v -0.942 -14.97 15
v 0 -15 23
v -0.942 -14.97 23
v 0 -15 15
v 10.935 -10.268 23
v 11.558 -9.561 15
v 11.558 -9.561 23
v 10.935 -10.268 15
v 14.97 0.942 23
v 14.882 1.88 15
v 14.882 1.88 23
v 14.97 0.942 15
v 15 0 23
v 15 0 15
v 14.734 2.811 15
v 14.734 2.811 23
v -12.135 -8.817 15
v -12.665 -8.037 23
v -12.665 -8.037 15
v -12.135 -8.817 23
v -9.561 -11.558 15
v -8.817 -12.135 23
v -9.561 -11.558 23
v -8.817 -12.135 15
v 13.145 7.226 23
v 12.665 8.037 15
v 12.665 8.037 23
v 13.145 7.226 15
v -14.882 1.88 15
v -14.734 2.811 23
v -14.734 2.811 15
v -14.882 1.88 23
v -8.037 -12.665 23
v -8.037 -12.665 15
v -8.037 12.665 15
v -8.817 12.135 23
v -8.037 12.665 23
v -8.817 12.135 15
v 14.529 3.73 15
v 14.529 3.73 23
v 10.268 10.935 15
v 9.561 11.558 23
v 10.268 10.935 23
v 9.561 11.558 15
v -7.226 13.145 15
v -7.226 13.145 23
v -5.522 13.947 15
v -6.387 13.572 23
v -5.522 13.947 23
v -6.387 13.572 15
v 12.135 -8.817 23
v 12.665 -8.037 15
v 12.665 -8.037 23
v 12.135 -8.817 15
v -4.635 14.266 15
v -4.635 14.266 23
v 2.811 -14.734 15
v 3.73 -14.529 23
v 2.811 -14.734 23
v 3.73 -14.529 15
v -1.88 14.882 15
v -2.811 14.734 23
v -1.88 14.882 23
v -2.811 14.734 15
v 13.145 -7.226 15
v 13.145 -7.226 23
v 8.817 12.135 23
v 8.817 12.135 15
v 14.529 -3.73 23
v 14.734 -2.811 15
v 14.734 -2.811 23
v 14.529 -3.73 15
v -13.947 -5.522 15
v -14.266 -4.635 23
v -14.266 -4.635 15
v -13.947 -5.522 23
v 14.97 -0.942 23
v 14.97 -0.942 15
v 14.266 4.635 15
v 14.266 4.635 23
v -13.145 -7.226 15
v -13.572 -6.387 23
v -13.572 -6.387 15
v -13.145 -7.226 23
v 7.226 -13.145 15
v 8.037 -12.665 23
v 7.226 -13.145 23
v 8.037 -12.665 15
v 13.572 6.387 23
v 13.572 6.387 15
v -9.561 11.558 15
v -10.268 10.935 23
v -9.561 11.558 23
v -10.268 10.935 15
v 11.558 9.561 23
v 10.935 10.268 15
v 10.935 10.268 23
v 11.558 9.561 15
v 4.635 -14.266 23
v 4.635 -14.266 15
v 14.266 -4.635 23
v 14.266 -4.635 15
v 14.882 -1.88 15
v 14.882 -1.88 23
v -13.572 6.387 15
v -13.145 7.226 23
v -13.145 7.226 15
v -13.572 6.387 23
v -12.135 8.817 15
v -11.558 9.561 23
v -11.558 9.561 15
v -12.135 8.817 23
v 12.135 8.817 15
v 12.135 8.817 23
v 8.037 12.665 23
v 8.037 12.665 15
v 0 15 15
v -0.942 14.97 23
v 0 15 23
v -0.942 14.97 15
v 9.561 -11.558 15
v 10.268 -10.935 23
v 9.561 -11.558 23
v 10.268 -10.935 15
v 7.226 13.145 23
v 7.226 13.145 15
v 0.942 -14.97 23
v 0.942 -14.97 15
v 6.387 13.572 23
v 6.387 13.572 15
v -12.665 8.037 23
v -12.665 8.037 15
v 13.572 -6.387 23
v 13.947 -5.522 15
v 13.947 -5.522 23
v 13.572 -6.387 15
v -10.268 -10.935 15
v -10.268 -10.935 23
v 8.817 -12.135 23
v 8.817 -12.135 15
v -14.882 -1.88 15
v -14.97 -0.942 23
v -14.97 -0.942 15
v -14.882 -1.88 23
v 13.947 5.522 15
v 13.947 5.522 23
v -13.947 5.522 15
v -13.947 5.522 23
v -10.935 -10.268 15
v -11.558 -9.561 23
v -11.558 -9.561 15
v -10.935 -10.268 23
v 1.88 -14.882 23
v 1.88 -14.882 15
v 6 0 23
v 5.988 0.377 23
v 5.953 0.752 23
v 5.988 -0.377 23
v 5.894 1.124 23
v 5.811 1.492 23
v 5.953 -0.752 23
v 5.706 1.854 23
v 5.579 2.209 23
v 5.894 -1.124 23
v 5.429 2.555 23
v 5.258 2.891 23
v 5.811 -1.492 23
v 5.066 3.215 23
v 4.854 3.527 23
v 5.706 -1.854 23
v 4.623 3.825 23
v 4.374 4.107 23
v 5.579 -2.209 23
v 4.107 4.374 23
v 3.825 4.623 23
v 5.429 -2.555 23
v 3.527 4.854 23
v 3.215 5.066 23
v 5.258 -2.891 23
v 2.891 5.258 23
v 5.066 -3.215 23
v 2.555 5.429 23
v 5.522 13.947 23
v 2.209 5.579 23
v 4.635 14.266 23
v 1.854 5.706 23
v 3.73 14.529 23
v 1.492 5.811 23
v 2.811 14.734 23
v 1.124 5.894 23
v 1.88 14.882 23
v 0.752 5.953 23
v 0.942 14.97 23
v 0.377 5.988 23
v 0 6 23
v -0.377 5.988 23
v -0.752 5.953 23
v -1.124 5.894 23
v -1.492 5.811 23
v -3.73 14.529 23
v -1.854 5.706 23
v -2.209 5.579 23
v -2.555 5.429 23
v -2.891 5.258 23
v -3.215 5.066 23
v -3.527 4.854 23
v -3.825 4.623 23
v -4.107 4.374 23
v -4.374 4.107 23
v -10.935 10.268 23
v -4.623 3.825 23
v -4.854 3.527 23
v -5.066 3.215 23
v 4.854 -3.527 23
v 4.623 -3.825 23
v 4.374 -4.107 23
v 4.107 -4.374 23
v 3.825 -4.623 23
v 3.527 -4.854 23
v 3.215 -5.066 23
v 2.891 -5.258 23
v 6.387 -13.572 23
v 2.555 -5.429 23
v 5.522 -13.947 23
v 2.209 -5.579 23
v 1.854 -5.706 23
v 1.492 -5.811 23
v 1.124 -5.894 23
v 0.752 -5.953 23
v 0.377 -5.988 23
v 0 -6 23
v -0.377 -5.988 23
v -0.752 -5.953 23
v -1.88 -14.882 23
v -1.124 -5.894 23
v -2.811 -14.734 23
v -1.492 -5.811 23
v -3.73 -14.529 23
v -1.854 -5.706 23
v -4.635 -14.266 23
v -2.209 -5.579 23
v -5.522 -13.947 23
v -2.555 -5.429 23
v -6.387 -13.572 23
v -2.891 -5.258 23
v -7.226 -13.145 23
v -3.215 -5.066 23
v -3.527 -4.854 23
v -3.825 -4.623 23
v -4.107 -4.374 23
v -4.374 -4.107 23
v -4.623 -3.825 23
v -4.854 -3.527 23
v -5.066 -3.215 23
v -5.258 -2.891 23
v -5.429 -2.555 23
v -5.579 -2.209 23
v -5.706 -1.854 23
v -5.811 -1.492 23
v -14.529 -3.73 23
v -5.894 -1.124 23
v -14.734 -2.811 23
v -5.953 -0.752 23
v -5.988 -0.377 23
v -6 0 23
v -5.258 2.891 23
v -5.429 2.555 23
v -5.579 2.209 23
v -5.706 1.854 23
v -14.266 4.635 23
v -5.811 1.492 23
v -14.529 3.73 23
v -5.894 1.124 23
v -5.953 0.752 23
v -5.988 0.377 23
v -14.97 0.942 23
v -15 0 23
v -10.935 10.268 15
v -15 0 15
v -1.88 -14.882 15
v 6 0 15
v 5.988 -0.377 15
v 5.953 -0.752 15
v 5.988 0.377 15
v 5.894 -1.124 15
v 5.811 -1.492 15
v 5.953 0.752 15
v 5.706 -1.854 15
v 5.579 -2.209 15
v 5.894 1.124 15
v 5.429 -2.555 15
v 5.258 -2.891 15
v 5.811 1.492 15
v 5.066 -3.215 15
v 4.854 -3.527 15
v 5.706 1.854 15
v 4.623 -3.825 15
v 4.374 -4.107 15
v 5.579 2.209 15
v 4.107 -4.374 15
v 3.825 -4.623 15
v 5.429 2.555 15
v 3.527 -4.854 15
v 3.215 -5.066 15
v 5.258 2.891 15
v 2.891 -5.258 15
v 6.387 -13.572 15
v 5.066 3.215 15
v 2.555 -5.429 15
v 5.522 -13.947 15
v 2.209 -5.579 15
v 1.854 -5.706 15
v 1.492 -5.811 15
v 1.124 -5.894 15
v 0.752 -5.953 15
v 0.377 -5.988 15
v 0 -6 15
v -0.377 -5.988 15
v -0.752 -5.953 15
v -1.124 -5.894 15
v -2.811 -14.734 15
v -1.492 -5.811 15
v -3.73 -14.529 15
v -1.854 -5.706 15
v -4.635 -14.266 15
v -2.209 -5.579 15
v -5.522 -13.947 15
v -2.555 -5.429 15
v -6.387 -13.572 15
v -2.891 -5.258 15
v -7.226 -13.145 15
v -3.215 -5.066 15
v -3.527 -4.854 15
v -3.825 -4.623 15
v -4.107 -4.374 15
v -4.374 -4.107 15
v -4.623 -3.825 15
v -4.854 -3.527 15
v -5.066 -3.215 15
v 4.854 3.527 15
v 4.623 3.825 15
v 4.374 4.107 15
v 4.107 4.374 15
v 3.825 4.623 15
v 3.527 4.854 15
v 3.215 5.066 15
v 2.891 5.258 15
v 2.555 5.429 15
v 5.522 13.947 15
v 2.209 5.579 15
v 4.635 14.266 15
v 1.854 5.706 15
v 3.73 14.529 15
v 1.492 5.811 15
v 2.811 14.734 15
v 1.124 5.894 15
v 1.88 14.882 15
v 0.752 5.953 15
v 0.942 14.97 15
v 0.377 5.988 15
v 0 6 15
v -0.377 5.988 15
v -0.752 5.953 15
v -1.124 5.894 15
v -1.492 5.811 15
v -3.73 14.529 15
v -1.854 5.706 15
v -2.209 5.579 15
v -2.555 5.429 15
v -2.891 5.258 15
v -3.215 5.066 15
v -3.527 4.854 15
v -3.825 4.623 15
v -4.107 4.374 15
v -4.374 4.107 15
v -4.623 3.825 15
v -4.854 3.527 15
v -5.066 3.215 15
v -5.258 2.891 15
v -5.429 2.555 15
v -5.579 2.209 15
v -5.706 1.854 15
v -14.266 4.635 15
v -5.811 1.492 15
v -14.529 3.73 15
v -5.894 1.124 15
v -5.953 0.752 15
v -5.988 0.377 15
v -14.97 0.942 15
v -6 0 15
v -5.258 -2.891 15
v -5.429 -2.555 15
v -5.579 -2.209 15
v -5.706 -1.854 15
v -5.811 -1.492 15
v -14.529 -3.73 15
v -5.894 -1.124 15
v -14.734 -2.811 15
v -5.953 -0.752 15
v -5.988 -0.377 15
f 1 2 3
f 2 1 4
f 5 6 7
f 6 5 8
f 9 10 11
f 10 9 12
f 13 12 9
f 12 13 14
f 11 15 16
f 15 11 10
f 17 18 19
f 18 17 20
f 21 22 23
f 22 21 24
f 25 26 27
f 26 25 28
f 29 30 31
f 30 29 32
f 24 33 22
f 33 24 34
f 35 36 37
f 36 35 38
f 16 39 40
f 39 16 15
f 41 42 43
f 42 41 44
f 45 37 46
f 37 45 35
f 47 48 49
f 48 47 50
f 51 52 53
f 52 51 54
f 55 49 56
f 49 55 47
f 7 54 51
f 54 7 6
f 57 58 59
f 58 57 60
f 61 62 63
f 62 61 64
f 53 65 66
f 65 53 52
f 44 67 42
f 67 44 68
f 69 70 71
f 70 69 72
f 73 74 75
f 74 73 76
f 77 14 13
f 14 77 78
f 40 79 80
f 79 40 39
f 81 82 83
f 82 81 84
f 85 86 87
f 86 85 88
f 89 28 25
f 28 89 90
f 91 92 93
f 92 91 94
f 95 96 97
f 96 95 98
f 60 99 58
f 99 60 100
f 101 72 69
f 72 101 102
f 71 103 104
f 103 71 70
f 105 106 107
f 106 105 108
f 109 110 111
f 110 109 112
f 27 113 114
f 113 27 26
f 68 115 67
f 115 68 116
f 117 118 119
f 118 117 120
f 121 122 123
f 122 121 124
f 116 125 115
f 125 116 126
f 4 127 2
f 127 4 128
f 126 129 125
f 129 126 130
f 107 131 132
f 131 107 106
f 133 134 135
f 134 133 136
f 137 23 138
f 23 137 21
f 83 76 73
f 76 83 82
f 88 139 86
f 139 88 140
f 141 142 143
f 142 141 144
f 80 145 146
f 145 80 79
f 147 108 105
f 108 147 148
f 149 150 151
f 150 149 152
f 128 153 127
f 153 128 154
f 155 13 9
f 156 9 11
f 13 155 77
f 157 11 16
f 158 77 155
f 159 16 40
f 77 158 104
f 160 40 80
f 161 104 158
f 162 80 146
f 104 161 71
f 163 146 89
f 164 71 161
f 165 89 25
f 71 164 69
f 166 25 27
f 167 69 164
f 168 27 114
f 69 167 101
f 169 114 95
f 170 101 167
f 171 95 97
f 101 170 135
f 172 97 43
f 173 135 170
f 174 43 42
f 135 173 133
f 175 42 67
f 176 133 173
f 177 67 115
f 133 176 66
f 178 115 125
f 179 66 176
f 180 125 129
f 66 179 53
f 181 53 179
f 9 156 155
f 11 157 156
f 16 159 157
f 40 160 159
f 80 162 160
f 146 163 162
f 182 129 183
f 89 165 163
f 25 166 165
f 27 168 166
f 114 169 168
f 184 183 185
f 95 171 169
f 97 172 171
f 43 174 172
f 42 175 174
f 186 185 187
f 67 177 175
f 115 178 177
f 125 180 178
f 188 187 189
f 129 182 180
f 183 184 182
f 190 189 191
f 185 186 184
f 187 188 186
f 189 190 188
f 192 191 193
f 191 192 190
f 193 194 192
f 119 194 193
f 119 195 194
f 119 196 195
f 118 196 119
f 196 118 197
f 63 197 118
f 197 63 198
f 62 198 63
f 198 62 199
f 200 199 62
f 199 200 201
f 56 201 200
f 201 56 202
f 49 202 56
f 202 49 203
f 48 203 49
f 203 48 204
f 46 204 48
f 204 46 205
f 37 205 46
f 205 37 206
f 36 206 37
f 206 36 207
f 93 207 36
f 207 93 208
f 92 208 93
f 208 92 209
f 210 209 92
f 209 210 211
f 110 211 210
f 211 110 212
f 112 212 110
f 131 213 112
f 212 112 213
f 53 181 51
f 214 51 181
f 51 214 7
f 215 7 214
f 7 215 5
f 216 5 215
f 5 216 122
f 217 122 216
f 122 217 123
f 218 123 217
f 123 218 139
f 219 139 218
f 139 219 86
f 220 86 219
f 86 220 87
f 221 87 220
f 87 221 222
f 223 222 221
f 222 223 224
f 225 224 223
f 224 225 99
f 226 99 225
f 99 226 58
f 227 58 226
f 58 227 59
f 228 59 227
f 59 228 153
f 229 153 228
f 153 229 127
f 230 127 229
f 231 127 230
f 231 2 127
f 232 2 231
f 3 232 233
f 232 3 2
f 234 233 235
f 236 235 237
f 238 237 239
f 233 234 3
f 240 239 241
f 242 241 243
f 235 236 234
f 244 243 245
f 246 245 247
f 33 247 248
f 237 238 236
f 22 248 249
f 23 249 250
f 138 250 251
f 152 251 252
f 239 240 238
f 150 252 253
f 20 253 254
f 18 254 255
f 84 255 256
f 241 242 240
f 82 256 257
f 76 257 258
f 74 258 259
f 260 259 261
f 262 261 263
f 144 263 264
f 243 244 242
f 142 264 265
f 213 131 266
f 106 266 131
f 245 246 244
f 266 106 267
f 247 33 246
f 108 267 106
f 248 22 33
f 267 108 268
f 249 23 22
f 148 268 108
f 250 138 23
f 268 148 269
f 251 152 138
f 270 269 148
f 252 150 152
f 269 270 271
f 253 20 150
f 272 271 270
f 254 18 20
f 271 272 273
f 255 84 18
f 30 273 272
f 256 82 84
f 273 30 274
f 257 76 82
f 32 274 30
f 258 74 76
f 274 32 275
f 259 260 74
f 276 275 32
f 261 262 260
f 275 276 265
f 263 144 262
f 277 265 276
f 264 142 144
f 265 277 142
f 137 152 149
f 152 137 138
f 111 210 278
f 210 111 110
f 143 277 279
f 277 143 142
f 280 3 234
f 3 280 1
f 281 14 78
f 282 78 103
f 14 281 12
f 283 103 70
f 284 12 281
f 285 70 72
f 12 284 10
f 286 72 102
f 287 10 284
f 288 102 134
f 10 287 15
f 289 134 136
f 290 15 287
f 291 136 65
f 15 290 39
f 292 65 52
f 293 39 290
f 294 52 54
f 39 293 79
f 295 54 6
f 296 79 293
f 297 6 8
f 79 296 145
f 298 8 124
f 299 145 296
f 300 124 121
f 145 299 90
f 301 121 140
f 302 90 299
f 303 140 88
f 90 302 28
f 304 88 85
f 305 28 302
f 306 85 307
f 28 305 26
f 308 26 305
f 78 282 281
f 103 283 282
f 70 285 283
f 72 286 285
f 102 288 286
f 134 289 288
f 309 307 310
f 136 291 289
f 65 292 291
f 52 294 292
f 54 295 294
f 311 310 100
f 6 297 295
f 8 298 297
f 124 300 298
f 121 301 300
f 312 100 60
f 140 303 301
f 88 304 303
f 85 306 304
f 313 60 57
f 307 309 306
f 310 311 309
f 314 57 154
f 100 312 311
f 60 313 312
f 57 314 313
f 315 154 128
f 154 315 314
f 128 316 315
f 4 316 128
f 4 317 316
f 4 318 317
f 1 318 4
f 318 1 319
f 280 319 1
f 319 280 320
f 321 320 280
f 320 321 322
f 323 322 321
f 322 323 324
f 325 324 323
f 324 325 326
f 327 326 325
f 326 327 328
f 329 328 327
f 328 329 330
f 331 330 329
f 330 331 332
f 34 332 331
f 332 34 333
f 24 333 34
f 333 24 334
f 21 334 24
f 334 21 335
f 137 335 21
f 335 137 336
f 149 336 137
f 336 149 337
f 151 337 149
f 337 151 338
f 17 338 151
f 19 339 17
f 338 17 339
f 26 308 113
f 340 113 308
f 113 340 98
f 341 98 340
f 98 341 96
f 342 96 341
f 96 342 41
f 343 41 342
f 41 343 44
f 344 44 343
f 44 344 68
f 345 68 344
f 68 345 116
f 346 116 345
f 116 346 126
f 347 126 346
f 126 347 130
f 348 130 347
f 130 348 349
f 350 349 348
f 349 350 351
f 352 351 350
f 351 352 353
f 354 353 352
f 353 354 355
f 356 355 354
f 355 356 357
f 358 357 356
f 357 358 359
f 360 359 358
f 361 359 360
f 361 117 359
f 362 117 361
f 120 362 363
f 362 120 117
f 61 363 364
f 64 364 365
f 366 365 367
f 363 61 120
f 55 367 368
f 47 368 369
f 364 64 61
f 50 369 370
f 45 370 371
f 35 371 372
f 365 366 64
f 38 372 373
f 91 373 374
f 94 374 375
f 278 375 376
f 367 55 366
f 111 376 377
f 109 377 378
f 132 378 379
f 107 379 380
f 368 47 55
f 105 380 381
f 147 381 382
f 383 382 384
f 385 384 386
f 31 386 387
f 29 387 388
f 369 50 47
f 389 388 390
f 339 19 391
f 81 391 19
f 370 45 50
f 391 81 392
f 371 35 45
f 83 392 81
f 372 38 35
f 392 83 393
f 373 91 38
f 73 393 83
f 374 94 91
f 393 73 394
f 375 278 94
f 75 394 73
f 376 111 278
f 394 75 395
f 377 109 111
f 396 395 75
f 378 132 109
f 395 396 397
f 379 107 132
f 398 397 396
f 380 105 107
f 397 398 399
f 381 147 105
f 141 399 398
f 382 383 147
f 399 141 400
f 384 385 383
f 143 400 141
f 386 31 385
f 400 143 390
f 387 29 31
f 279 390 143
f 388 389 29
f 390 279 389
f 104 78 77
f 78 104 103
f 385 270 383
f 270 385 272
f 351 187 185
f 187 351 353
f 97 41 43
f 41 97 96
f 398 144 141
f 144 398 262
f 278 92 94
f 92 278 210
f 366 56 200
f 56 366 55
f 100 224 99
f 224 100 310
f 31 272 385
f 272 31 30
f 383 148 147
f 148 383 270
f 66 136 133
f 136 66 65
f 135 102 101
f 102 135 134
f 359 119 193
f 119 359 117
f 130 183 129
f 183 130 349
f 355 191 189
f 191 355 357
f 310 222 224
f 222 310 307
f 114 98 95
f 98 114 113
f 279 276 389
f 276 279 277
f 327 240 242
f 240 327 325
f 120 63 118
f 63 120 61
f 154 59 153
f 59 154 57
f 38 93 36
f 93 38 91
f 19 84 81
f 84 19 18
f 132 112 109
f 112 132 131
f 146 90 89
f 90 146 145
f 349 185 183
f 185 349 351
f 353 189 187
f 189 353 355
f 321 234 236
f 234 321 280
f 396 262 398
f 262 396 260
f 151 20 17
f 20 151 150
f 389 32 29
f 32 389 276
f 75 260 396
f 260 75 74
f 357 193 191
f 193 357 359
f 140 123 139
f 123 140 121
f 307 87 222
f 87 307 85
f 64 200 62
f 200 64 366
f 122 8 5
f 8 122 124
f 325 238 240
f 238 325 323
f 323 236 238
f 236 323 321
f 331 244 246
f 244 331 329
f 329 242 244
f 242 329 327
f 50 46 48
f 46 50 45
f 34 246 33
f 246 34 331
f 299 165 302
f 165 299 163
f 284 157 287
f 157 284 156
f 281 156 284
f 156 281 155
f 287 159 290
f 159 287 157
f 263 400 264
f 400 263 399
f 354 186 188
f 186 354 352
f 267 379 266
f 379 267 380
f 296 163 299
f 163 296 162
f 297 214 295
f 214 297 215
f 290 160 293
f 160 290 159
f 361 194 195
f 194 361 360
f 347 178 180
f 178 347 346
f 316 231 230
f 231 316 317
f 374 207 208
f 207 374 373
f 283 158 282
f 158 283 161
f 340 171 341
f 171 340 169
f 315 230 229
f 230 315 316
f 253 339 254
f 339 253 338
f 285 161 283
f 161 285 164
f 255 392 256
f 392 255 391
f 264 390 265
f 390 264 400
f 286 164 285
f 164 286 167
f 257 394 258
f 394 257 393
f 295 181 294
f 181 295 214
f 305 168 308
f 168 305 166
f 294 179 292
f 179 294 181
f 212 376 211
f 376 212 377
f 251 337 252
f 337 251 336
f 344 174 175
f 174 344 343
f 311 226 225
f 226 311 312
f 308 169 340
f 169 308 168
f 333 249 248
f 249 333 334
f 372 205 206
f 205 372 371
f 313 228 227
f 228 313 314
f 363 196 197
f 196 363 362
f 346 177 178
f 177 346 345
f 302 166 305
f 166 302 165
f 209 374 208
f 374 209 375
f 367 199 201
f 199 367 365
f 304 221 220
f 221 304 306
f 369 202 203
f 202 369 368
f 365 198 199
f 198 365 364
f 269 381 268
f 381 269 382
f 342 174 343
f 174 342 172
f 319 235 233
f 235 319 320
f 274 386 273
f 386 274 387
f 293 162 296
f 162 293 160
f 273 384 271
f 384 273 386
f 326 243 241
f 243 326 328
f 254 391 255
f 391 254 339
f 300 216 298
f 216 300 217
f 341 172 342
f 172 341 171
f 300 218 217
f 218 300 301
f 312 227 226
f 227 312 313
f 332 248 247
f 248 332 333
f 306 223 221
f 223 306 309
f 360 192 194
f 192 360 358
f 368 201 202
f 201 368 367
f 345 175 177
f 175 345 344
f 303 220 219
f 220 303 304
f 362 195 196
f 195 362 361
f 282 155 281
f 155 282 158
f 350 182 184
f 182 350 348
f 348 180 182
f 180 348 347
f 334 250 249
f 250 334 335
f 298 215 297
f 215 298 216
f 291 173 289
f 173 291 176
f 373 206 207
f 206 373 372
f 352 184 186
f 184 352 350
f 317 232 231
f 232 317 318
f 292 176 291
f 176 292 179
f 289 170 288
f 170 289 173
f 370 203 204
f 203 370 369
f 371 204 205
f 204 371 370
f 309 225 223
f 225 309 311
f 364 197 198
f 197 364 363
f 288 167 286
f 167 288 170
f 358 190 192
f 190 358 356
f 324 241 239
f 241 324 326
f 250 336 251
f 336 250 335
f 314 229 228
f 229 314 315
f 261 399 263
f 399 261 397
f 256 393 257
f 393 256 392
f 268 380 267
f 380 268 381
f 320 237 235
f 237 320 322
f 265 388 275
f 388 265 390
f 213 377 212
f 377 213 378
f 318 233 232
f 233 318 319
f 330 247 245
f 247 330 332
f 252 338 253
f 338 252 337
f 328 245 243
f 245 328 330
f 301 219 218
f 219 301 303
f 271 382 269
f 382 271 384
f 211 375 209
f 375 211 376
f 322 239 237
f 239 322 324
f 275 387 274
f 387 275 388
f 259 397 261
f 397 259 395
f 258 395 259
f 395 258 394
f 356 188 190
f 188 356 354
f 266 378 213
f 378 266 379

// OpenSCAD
// ==============================
// PARAMETRIC DIMENSIONS (all in mm)
// ==============================
// Base Parameters
base_length = 80;       // Total length of rounded base
base_width = 40;        // Width of base (curved ends have radius = base_width/2)
base_thickness = 15;    // Thickness of base plate
base_corner_r = base_width / 2; // Fully rounded end radius

// Raised Collar Parameters
collar_od = 30;         // Outer diameter of top annular collar
collar_id = 12;         // Inner diameter of collar bore
collar_height = 8;      // Height of collar above base top surface

// Stepped Center Bore Parameters
bore_step_dia = 18;     // Diameter of lower stepped bore section
bore_step_depth = 10;   // Depth of upper small bore from base top
through_hole_dia = 8;   // Diameter of full through opening

// Side Recess Parameters
side_recess_dia = 10;   // Diameter of shallow side recesses
side_recess_depth = 3;  // Depth of side recesses into base
num_side_recesses = 4;  // Number of side recesses (even count recommended)

// Underside Cut Pattern Parameters
undercut_dia = 12;      // Diameter of underside circular cuts
undercut_depth = 4;     // Depth of underside cuts from base bottom
undercut_pitch_r = 20;  // Radius of underside cut pattern from center
num_undercuts = 4;      // Number of underside pattern cuts

// Global Resolution Setting
$fn = 100;              // Smoothness for curved surfaces

// ==============================
// REUSABLE MODULES
// ==============================
// Rounded capsule-shaped base module
module capsule_base(length, width, thickness, corner_r) {
    linear_extrude(height=thickness, center=false) {
        // Generate rounded rectangle with fully curved ends
        offset(r=corner_r) square([length - 2*corner_r, width - 2*corner_r], center=true);
    }
}

// ==============================
// MAIN MODEL ASSEMBLY
// ==============================
difference() {
    // Combine base and raised collar as base solid
    union() {
        // Main rounded base plate
        capsule_base(base_length, base_width, base_thickness, base_corner_r);
        
        // Raised annular collar on top of base
        translate([0, 0, base_thickness]) cylinder(h=collar_height, d=collar_od, center=false);
    }

    // ------------------------------
    // Subtractive Cut Features
    // ------------------------------
    // 1. Stepped center bore + through hole
    // Upper small bore (through collar and top of base)
    translate([0, 0, base_thickness]) cylinder(h=collar_height + bore_step_depth, d=collar_id, center=false);
    // Lower stepped larger bore in base
    translate([0, 0, base_thickness + bore_step_depth]) cylinder(h=base_thickness - bore_step_depth, d=bore_step_dia, center=false);
    // Full through opening (cuts all layers)
    cylinder(h=base_thickness + collar_height + 2, d=through_hole_dia, center=true);

    // 2. Shallow side recesses
    for (i = [0:num_side_recesses - 1]) {
        rotate([0, 0, i * 360 / num_side_recesses])
        translate([base_length/2 + side_recess_depth/2, 0, base_thickness/2])
        cylinder(h=side_recess_depth + 1, d=side_recess_dia, center=true);
    }

    // 3. Underside circular cut pattern
    for (i = [0:num_undercuts - 1]) {
        rotate([0, 0, i * 360 / num_undercuts])
        translate([undercut_pitch_r, 0, -undercut_depth/2])
        cylinder(h=undercut_depth + 1, d=undercut_dia, center=true);
    }
}
